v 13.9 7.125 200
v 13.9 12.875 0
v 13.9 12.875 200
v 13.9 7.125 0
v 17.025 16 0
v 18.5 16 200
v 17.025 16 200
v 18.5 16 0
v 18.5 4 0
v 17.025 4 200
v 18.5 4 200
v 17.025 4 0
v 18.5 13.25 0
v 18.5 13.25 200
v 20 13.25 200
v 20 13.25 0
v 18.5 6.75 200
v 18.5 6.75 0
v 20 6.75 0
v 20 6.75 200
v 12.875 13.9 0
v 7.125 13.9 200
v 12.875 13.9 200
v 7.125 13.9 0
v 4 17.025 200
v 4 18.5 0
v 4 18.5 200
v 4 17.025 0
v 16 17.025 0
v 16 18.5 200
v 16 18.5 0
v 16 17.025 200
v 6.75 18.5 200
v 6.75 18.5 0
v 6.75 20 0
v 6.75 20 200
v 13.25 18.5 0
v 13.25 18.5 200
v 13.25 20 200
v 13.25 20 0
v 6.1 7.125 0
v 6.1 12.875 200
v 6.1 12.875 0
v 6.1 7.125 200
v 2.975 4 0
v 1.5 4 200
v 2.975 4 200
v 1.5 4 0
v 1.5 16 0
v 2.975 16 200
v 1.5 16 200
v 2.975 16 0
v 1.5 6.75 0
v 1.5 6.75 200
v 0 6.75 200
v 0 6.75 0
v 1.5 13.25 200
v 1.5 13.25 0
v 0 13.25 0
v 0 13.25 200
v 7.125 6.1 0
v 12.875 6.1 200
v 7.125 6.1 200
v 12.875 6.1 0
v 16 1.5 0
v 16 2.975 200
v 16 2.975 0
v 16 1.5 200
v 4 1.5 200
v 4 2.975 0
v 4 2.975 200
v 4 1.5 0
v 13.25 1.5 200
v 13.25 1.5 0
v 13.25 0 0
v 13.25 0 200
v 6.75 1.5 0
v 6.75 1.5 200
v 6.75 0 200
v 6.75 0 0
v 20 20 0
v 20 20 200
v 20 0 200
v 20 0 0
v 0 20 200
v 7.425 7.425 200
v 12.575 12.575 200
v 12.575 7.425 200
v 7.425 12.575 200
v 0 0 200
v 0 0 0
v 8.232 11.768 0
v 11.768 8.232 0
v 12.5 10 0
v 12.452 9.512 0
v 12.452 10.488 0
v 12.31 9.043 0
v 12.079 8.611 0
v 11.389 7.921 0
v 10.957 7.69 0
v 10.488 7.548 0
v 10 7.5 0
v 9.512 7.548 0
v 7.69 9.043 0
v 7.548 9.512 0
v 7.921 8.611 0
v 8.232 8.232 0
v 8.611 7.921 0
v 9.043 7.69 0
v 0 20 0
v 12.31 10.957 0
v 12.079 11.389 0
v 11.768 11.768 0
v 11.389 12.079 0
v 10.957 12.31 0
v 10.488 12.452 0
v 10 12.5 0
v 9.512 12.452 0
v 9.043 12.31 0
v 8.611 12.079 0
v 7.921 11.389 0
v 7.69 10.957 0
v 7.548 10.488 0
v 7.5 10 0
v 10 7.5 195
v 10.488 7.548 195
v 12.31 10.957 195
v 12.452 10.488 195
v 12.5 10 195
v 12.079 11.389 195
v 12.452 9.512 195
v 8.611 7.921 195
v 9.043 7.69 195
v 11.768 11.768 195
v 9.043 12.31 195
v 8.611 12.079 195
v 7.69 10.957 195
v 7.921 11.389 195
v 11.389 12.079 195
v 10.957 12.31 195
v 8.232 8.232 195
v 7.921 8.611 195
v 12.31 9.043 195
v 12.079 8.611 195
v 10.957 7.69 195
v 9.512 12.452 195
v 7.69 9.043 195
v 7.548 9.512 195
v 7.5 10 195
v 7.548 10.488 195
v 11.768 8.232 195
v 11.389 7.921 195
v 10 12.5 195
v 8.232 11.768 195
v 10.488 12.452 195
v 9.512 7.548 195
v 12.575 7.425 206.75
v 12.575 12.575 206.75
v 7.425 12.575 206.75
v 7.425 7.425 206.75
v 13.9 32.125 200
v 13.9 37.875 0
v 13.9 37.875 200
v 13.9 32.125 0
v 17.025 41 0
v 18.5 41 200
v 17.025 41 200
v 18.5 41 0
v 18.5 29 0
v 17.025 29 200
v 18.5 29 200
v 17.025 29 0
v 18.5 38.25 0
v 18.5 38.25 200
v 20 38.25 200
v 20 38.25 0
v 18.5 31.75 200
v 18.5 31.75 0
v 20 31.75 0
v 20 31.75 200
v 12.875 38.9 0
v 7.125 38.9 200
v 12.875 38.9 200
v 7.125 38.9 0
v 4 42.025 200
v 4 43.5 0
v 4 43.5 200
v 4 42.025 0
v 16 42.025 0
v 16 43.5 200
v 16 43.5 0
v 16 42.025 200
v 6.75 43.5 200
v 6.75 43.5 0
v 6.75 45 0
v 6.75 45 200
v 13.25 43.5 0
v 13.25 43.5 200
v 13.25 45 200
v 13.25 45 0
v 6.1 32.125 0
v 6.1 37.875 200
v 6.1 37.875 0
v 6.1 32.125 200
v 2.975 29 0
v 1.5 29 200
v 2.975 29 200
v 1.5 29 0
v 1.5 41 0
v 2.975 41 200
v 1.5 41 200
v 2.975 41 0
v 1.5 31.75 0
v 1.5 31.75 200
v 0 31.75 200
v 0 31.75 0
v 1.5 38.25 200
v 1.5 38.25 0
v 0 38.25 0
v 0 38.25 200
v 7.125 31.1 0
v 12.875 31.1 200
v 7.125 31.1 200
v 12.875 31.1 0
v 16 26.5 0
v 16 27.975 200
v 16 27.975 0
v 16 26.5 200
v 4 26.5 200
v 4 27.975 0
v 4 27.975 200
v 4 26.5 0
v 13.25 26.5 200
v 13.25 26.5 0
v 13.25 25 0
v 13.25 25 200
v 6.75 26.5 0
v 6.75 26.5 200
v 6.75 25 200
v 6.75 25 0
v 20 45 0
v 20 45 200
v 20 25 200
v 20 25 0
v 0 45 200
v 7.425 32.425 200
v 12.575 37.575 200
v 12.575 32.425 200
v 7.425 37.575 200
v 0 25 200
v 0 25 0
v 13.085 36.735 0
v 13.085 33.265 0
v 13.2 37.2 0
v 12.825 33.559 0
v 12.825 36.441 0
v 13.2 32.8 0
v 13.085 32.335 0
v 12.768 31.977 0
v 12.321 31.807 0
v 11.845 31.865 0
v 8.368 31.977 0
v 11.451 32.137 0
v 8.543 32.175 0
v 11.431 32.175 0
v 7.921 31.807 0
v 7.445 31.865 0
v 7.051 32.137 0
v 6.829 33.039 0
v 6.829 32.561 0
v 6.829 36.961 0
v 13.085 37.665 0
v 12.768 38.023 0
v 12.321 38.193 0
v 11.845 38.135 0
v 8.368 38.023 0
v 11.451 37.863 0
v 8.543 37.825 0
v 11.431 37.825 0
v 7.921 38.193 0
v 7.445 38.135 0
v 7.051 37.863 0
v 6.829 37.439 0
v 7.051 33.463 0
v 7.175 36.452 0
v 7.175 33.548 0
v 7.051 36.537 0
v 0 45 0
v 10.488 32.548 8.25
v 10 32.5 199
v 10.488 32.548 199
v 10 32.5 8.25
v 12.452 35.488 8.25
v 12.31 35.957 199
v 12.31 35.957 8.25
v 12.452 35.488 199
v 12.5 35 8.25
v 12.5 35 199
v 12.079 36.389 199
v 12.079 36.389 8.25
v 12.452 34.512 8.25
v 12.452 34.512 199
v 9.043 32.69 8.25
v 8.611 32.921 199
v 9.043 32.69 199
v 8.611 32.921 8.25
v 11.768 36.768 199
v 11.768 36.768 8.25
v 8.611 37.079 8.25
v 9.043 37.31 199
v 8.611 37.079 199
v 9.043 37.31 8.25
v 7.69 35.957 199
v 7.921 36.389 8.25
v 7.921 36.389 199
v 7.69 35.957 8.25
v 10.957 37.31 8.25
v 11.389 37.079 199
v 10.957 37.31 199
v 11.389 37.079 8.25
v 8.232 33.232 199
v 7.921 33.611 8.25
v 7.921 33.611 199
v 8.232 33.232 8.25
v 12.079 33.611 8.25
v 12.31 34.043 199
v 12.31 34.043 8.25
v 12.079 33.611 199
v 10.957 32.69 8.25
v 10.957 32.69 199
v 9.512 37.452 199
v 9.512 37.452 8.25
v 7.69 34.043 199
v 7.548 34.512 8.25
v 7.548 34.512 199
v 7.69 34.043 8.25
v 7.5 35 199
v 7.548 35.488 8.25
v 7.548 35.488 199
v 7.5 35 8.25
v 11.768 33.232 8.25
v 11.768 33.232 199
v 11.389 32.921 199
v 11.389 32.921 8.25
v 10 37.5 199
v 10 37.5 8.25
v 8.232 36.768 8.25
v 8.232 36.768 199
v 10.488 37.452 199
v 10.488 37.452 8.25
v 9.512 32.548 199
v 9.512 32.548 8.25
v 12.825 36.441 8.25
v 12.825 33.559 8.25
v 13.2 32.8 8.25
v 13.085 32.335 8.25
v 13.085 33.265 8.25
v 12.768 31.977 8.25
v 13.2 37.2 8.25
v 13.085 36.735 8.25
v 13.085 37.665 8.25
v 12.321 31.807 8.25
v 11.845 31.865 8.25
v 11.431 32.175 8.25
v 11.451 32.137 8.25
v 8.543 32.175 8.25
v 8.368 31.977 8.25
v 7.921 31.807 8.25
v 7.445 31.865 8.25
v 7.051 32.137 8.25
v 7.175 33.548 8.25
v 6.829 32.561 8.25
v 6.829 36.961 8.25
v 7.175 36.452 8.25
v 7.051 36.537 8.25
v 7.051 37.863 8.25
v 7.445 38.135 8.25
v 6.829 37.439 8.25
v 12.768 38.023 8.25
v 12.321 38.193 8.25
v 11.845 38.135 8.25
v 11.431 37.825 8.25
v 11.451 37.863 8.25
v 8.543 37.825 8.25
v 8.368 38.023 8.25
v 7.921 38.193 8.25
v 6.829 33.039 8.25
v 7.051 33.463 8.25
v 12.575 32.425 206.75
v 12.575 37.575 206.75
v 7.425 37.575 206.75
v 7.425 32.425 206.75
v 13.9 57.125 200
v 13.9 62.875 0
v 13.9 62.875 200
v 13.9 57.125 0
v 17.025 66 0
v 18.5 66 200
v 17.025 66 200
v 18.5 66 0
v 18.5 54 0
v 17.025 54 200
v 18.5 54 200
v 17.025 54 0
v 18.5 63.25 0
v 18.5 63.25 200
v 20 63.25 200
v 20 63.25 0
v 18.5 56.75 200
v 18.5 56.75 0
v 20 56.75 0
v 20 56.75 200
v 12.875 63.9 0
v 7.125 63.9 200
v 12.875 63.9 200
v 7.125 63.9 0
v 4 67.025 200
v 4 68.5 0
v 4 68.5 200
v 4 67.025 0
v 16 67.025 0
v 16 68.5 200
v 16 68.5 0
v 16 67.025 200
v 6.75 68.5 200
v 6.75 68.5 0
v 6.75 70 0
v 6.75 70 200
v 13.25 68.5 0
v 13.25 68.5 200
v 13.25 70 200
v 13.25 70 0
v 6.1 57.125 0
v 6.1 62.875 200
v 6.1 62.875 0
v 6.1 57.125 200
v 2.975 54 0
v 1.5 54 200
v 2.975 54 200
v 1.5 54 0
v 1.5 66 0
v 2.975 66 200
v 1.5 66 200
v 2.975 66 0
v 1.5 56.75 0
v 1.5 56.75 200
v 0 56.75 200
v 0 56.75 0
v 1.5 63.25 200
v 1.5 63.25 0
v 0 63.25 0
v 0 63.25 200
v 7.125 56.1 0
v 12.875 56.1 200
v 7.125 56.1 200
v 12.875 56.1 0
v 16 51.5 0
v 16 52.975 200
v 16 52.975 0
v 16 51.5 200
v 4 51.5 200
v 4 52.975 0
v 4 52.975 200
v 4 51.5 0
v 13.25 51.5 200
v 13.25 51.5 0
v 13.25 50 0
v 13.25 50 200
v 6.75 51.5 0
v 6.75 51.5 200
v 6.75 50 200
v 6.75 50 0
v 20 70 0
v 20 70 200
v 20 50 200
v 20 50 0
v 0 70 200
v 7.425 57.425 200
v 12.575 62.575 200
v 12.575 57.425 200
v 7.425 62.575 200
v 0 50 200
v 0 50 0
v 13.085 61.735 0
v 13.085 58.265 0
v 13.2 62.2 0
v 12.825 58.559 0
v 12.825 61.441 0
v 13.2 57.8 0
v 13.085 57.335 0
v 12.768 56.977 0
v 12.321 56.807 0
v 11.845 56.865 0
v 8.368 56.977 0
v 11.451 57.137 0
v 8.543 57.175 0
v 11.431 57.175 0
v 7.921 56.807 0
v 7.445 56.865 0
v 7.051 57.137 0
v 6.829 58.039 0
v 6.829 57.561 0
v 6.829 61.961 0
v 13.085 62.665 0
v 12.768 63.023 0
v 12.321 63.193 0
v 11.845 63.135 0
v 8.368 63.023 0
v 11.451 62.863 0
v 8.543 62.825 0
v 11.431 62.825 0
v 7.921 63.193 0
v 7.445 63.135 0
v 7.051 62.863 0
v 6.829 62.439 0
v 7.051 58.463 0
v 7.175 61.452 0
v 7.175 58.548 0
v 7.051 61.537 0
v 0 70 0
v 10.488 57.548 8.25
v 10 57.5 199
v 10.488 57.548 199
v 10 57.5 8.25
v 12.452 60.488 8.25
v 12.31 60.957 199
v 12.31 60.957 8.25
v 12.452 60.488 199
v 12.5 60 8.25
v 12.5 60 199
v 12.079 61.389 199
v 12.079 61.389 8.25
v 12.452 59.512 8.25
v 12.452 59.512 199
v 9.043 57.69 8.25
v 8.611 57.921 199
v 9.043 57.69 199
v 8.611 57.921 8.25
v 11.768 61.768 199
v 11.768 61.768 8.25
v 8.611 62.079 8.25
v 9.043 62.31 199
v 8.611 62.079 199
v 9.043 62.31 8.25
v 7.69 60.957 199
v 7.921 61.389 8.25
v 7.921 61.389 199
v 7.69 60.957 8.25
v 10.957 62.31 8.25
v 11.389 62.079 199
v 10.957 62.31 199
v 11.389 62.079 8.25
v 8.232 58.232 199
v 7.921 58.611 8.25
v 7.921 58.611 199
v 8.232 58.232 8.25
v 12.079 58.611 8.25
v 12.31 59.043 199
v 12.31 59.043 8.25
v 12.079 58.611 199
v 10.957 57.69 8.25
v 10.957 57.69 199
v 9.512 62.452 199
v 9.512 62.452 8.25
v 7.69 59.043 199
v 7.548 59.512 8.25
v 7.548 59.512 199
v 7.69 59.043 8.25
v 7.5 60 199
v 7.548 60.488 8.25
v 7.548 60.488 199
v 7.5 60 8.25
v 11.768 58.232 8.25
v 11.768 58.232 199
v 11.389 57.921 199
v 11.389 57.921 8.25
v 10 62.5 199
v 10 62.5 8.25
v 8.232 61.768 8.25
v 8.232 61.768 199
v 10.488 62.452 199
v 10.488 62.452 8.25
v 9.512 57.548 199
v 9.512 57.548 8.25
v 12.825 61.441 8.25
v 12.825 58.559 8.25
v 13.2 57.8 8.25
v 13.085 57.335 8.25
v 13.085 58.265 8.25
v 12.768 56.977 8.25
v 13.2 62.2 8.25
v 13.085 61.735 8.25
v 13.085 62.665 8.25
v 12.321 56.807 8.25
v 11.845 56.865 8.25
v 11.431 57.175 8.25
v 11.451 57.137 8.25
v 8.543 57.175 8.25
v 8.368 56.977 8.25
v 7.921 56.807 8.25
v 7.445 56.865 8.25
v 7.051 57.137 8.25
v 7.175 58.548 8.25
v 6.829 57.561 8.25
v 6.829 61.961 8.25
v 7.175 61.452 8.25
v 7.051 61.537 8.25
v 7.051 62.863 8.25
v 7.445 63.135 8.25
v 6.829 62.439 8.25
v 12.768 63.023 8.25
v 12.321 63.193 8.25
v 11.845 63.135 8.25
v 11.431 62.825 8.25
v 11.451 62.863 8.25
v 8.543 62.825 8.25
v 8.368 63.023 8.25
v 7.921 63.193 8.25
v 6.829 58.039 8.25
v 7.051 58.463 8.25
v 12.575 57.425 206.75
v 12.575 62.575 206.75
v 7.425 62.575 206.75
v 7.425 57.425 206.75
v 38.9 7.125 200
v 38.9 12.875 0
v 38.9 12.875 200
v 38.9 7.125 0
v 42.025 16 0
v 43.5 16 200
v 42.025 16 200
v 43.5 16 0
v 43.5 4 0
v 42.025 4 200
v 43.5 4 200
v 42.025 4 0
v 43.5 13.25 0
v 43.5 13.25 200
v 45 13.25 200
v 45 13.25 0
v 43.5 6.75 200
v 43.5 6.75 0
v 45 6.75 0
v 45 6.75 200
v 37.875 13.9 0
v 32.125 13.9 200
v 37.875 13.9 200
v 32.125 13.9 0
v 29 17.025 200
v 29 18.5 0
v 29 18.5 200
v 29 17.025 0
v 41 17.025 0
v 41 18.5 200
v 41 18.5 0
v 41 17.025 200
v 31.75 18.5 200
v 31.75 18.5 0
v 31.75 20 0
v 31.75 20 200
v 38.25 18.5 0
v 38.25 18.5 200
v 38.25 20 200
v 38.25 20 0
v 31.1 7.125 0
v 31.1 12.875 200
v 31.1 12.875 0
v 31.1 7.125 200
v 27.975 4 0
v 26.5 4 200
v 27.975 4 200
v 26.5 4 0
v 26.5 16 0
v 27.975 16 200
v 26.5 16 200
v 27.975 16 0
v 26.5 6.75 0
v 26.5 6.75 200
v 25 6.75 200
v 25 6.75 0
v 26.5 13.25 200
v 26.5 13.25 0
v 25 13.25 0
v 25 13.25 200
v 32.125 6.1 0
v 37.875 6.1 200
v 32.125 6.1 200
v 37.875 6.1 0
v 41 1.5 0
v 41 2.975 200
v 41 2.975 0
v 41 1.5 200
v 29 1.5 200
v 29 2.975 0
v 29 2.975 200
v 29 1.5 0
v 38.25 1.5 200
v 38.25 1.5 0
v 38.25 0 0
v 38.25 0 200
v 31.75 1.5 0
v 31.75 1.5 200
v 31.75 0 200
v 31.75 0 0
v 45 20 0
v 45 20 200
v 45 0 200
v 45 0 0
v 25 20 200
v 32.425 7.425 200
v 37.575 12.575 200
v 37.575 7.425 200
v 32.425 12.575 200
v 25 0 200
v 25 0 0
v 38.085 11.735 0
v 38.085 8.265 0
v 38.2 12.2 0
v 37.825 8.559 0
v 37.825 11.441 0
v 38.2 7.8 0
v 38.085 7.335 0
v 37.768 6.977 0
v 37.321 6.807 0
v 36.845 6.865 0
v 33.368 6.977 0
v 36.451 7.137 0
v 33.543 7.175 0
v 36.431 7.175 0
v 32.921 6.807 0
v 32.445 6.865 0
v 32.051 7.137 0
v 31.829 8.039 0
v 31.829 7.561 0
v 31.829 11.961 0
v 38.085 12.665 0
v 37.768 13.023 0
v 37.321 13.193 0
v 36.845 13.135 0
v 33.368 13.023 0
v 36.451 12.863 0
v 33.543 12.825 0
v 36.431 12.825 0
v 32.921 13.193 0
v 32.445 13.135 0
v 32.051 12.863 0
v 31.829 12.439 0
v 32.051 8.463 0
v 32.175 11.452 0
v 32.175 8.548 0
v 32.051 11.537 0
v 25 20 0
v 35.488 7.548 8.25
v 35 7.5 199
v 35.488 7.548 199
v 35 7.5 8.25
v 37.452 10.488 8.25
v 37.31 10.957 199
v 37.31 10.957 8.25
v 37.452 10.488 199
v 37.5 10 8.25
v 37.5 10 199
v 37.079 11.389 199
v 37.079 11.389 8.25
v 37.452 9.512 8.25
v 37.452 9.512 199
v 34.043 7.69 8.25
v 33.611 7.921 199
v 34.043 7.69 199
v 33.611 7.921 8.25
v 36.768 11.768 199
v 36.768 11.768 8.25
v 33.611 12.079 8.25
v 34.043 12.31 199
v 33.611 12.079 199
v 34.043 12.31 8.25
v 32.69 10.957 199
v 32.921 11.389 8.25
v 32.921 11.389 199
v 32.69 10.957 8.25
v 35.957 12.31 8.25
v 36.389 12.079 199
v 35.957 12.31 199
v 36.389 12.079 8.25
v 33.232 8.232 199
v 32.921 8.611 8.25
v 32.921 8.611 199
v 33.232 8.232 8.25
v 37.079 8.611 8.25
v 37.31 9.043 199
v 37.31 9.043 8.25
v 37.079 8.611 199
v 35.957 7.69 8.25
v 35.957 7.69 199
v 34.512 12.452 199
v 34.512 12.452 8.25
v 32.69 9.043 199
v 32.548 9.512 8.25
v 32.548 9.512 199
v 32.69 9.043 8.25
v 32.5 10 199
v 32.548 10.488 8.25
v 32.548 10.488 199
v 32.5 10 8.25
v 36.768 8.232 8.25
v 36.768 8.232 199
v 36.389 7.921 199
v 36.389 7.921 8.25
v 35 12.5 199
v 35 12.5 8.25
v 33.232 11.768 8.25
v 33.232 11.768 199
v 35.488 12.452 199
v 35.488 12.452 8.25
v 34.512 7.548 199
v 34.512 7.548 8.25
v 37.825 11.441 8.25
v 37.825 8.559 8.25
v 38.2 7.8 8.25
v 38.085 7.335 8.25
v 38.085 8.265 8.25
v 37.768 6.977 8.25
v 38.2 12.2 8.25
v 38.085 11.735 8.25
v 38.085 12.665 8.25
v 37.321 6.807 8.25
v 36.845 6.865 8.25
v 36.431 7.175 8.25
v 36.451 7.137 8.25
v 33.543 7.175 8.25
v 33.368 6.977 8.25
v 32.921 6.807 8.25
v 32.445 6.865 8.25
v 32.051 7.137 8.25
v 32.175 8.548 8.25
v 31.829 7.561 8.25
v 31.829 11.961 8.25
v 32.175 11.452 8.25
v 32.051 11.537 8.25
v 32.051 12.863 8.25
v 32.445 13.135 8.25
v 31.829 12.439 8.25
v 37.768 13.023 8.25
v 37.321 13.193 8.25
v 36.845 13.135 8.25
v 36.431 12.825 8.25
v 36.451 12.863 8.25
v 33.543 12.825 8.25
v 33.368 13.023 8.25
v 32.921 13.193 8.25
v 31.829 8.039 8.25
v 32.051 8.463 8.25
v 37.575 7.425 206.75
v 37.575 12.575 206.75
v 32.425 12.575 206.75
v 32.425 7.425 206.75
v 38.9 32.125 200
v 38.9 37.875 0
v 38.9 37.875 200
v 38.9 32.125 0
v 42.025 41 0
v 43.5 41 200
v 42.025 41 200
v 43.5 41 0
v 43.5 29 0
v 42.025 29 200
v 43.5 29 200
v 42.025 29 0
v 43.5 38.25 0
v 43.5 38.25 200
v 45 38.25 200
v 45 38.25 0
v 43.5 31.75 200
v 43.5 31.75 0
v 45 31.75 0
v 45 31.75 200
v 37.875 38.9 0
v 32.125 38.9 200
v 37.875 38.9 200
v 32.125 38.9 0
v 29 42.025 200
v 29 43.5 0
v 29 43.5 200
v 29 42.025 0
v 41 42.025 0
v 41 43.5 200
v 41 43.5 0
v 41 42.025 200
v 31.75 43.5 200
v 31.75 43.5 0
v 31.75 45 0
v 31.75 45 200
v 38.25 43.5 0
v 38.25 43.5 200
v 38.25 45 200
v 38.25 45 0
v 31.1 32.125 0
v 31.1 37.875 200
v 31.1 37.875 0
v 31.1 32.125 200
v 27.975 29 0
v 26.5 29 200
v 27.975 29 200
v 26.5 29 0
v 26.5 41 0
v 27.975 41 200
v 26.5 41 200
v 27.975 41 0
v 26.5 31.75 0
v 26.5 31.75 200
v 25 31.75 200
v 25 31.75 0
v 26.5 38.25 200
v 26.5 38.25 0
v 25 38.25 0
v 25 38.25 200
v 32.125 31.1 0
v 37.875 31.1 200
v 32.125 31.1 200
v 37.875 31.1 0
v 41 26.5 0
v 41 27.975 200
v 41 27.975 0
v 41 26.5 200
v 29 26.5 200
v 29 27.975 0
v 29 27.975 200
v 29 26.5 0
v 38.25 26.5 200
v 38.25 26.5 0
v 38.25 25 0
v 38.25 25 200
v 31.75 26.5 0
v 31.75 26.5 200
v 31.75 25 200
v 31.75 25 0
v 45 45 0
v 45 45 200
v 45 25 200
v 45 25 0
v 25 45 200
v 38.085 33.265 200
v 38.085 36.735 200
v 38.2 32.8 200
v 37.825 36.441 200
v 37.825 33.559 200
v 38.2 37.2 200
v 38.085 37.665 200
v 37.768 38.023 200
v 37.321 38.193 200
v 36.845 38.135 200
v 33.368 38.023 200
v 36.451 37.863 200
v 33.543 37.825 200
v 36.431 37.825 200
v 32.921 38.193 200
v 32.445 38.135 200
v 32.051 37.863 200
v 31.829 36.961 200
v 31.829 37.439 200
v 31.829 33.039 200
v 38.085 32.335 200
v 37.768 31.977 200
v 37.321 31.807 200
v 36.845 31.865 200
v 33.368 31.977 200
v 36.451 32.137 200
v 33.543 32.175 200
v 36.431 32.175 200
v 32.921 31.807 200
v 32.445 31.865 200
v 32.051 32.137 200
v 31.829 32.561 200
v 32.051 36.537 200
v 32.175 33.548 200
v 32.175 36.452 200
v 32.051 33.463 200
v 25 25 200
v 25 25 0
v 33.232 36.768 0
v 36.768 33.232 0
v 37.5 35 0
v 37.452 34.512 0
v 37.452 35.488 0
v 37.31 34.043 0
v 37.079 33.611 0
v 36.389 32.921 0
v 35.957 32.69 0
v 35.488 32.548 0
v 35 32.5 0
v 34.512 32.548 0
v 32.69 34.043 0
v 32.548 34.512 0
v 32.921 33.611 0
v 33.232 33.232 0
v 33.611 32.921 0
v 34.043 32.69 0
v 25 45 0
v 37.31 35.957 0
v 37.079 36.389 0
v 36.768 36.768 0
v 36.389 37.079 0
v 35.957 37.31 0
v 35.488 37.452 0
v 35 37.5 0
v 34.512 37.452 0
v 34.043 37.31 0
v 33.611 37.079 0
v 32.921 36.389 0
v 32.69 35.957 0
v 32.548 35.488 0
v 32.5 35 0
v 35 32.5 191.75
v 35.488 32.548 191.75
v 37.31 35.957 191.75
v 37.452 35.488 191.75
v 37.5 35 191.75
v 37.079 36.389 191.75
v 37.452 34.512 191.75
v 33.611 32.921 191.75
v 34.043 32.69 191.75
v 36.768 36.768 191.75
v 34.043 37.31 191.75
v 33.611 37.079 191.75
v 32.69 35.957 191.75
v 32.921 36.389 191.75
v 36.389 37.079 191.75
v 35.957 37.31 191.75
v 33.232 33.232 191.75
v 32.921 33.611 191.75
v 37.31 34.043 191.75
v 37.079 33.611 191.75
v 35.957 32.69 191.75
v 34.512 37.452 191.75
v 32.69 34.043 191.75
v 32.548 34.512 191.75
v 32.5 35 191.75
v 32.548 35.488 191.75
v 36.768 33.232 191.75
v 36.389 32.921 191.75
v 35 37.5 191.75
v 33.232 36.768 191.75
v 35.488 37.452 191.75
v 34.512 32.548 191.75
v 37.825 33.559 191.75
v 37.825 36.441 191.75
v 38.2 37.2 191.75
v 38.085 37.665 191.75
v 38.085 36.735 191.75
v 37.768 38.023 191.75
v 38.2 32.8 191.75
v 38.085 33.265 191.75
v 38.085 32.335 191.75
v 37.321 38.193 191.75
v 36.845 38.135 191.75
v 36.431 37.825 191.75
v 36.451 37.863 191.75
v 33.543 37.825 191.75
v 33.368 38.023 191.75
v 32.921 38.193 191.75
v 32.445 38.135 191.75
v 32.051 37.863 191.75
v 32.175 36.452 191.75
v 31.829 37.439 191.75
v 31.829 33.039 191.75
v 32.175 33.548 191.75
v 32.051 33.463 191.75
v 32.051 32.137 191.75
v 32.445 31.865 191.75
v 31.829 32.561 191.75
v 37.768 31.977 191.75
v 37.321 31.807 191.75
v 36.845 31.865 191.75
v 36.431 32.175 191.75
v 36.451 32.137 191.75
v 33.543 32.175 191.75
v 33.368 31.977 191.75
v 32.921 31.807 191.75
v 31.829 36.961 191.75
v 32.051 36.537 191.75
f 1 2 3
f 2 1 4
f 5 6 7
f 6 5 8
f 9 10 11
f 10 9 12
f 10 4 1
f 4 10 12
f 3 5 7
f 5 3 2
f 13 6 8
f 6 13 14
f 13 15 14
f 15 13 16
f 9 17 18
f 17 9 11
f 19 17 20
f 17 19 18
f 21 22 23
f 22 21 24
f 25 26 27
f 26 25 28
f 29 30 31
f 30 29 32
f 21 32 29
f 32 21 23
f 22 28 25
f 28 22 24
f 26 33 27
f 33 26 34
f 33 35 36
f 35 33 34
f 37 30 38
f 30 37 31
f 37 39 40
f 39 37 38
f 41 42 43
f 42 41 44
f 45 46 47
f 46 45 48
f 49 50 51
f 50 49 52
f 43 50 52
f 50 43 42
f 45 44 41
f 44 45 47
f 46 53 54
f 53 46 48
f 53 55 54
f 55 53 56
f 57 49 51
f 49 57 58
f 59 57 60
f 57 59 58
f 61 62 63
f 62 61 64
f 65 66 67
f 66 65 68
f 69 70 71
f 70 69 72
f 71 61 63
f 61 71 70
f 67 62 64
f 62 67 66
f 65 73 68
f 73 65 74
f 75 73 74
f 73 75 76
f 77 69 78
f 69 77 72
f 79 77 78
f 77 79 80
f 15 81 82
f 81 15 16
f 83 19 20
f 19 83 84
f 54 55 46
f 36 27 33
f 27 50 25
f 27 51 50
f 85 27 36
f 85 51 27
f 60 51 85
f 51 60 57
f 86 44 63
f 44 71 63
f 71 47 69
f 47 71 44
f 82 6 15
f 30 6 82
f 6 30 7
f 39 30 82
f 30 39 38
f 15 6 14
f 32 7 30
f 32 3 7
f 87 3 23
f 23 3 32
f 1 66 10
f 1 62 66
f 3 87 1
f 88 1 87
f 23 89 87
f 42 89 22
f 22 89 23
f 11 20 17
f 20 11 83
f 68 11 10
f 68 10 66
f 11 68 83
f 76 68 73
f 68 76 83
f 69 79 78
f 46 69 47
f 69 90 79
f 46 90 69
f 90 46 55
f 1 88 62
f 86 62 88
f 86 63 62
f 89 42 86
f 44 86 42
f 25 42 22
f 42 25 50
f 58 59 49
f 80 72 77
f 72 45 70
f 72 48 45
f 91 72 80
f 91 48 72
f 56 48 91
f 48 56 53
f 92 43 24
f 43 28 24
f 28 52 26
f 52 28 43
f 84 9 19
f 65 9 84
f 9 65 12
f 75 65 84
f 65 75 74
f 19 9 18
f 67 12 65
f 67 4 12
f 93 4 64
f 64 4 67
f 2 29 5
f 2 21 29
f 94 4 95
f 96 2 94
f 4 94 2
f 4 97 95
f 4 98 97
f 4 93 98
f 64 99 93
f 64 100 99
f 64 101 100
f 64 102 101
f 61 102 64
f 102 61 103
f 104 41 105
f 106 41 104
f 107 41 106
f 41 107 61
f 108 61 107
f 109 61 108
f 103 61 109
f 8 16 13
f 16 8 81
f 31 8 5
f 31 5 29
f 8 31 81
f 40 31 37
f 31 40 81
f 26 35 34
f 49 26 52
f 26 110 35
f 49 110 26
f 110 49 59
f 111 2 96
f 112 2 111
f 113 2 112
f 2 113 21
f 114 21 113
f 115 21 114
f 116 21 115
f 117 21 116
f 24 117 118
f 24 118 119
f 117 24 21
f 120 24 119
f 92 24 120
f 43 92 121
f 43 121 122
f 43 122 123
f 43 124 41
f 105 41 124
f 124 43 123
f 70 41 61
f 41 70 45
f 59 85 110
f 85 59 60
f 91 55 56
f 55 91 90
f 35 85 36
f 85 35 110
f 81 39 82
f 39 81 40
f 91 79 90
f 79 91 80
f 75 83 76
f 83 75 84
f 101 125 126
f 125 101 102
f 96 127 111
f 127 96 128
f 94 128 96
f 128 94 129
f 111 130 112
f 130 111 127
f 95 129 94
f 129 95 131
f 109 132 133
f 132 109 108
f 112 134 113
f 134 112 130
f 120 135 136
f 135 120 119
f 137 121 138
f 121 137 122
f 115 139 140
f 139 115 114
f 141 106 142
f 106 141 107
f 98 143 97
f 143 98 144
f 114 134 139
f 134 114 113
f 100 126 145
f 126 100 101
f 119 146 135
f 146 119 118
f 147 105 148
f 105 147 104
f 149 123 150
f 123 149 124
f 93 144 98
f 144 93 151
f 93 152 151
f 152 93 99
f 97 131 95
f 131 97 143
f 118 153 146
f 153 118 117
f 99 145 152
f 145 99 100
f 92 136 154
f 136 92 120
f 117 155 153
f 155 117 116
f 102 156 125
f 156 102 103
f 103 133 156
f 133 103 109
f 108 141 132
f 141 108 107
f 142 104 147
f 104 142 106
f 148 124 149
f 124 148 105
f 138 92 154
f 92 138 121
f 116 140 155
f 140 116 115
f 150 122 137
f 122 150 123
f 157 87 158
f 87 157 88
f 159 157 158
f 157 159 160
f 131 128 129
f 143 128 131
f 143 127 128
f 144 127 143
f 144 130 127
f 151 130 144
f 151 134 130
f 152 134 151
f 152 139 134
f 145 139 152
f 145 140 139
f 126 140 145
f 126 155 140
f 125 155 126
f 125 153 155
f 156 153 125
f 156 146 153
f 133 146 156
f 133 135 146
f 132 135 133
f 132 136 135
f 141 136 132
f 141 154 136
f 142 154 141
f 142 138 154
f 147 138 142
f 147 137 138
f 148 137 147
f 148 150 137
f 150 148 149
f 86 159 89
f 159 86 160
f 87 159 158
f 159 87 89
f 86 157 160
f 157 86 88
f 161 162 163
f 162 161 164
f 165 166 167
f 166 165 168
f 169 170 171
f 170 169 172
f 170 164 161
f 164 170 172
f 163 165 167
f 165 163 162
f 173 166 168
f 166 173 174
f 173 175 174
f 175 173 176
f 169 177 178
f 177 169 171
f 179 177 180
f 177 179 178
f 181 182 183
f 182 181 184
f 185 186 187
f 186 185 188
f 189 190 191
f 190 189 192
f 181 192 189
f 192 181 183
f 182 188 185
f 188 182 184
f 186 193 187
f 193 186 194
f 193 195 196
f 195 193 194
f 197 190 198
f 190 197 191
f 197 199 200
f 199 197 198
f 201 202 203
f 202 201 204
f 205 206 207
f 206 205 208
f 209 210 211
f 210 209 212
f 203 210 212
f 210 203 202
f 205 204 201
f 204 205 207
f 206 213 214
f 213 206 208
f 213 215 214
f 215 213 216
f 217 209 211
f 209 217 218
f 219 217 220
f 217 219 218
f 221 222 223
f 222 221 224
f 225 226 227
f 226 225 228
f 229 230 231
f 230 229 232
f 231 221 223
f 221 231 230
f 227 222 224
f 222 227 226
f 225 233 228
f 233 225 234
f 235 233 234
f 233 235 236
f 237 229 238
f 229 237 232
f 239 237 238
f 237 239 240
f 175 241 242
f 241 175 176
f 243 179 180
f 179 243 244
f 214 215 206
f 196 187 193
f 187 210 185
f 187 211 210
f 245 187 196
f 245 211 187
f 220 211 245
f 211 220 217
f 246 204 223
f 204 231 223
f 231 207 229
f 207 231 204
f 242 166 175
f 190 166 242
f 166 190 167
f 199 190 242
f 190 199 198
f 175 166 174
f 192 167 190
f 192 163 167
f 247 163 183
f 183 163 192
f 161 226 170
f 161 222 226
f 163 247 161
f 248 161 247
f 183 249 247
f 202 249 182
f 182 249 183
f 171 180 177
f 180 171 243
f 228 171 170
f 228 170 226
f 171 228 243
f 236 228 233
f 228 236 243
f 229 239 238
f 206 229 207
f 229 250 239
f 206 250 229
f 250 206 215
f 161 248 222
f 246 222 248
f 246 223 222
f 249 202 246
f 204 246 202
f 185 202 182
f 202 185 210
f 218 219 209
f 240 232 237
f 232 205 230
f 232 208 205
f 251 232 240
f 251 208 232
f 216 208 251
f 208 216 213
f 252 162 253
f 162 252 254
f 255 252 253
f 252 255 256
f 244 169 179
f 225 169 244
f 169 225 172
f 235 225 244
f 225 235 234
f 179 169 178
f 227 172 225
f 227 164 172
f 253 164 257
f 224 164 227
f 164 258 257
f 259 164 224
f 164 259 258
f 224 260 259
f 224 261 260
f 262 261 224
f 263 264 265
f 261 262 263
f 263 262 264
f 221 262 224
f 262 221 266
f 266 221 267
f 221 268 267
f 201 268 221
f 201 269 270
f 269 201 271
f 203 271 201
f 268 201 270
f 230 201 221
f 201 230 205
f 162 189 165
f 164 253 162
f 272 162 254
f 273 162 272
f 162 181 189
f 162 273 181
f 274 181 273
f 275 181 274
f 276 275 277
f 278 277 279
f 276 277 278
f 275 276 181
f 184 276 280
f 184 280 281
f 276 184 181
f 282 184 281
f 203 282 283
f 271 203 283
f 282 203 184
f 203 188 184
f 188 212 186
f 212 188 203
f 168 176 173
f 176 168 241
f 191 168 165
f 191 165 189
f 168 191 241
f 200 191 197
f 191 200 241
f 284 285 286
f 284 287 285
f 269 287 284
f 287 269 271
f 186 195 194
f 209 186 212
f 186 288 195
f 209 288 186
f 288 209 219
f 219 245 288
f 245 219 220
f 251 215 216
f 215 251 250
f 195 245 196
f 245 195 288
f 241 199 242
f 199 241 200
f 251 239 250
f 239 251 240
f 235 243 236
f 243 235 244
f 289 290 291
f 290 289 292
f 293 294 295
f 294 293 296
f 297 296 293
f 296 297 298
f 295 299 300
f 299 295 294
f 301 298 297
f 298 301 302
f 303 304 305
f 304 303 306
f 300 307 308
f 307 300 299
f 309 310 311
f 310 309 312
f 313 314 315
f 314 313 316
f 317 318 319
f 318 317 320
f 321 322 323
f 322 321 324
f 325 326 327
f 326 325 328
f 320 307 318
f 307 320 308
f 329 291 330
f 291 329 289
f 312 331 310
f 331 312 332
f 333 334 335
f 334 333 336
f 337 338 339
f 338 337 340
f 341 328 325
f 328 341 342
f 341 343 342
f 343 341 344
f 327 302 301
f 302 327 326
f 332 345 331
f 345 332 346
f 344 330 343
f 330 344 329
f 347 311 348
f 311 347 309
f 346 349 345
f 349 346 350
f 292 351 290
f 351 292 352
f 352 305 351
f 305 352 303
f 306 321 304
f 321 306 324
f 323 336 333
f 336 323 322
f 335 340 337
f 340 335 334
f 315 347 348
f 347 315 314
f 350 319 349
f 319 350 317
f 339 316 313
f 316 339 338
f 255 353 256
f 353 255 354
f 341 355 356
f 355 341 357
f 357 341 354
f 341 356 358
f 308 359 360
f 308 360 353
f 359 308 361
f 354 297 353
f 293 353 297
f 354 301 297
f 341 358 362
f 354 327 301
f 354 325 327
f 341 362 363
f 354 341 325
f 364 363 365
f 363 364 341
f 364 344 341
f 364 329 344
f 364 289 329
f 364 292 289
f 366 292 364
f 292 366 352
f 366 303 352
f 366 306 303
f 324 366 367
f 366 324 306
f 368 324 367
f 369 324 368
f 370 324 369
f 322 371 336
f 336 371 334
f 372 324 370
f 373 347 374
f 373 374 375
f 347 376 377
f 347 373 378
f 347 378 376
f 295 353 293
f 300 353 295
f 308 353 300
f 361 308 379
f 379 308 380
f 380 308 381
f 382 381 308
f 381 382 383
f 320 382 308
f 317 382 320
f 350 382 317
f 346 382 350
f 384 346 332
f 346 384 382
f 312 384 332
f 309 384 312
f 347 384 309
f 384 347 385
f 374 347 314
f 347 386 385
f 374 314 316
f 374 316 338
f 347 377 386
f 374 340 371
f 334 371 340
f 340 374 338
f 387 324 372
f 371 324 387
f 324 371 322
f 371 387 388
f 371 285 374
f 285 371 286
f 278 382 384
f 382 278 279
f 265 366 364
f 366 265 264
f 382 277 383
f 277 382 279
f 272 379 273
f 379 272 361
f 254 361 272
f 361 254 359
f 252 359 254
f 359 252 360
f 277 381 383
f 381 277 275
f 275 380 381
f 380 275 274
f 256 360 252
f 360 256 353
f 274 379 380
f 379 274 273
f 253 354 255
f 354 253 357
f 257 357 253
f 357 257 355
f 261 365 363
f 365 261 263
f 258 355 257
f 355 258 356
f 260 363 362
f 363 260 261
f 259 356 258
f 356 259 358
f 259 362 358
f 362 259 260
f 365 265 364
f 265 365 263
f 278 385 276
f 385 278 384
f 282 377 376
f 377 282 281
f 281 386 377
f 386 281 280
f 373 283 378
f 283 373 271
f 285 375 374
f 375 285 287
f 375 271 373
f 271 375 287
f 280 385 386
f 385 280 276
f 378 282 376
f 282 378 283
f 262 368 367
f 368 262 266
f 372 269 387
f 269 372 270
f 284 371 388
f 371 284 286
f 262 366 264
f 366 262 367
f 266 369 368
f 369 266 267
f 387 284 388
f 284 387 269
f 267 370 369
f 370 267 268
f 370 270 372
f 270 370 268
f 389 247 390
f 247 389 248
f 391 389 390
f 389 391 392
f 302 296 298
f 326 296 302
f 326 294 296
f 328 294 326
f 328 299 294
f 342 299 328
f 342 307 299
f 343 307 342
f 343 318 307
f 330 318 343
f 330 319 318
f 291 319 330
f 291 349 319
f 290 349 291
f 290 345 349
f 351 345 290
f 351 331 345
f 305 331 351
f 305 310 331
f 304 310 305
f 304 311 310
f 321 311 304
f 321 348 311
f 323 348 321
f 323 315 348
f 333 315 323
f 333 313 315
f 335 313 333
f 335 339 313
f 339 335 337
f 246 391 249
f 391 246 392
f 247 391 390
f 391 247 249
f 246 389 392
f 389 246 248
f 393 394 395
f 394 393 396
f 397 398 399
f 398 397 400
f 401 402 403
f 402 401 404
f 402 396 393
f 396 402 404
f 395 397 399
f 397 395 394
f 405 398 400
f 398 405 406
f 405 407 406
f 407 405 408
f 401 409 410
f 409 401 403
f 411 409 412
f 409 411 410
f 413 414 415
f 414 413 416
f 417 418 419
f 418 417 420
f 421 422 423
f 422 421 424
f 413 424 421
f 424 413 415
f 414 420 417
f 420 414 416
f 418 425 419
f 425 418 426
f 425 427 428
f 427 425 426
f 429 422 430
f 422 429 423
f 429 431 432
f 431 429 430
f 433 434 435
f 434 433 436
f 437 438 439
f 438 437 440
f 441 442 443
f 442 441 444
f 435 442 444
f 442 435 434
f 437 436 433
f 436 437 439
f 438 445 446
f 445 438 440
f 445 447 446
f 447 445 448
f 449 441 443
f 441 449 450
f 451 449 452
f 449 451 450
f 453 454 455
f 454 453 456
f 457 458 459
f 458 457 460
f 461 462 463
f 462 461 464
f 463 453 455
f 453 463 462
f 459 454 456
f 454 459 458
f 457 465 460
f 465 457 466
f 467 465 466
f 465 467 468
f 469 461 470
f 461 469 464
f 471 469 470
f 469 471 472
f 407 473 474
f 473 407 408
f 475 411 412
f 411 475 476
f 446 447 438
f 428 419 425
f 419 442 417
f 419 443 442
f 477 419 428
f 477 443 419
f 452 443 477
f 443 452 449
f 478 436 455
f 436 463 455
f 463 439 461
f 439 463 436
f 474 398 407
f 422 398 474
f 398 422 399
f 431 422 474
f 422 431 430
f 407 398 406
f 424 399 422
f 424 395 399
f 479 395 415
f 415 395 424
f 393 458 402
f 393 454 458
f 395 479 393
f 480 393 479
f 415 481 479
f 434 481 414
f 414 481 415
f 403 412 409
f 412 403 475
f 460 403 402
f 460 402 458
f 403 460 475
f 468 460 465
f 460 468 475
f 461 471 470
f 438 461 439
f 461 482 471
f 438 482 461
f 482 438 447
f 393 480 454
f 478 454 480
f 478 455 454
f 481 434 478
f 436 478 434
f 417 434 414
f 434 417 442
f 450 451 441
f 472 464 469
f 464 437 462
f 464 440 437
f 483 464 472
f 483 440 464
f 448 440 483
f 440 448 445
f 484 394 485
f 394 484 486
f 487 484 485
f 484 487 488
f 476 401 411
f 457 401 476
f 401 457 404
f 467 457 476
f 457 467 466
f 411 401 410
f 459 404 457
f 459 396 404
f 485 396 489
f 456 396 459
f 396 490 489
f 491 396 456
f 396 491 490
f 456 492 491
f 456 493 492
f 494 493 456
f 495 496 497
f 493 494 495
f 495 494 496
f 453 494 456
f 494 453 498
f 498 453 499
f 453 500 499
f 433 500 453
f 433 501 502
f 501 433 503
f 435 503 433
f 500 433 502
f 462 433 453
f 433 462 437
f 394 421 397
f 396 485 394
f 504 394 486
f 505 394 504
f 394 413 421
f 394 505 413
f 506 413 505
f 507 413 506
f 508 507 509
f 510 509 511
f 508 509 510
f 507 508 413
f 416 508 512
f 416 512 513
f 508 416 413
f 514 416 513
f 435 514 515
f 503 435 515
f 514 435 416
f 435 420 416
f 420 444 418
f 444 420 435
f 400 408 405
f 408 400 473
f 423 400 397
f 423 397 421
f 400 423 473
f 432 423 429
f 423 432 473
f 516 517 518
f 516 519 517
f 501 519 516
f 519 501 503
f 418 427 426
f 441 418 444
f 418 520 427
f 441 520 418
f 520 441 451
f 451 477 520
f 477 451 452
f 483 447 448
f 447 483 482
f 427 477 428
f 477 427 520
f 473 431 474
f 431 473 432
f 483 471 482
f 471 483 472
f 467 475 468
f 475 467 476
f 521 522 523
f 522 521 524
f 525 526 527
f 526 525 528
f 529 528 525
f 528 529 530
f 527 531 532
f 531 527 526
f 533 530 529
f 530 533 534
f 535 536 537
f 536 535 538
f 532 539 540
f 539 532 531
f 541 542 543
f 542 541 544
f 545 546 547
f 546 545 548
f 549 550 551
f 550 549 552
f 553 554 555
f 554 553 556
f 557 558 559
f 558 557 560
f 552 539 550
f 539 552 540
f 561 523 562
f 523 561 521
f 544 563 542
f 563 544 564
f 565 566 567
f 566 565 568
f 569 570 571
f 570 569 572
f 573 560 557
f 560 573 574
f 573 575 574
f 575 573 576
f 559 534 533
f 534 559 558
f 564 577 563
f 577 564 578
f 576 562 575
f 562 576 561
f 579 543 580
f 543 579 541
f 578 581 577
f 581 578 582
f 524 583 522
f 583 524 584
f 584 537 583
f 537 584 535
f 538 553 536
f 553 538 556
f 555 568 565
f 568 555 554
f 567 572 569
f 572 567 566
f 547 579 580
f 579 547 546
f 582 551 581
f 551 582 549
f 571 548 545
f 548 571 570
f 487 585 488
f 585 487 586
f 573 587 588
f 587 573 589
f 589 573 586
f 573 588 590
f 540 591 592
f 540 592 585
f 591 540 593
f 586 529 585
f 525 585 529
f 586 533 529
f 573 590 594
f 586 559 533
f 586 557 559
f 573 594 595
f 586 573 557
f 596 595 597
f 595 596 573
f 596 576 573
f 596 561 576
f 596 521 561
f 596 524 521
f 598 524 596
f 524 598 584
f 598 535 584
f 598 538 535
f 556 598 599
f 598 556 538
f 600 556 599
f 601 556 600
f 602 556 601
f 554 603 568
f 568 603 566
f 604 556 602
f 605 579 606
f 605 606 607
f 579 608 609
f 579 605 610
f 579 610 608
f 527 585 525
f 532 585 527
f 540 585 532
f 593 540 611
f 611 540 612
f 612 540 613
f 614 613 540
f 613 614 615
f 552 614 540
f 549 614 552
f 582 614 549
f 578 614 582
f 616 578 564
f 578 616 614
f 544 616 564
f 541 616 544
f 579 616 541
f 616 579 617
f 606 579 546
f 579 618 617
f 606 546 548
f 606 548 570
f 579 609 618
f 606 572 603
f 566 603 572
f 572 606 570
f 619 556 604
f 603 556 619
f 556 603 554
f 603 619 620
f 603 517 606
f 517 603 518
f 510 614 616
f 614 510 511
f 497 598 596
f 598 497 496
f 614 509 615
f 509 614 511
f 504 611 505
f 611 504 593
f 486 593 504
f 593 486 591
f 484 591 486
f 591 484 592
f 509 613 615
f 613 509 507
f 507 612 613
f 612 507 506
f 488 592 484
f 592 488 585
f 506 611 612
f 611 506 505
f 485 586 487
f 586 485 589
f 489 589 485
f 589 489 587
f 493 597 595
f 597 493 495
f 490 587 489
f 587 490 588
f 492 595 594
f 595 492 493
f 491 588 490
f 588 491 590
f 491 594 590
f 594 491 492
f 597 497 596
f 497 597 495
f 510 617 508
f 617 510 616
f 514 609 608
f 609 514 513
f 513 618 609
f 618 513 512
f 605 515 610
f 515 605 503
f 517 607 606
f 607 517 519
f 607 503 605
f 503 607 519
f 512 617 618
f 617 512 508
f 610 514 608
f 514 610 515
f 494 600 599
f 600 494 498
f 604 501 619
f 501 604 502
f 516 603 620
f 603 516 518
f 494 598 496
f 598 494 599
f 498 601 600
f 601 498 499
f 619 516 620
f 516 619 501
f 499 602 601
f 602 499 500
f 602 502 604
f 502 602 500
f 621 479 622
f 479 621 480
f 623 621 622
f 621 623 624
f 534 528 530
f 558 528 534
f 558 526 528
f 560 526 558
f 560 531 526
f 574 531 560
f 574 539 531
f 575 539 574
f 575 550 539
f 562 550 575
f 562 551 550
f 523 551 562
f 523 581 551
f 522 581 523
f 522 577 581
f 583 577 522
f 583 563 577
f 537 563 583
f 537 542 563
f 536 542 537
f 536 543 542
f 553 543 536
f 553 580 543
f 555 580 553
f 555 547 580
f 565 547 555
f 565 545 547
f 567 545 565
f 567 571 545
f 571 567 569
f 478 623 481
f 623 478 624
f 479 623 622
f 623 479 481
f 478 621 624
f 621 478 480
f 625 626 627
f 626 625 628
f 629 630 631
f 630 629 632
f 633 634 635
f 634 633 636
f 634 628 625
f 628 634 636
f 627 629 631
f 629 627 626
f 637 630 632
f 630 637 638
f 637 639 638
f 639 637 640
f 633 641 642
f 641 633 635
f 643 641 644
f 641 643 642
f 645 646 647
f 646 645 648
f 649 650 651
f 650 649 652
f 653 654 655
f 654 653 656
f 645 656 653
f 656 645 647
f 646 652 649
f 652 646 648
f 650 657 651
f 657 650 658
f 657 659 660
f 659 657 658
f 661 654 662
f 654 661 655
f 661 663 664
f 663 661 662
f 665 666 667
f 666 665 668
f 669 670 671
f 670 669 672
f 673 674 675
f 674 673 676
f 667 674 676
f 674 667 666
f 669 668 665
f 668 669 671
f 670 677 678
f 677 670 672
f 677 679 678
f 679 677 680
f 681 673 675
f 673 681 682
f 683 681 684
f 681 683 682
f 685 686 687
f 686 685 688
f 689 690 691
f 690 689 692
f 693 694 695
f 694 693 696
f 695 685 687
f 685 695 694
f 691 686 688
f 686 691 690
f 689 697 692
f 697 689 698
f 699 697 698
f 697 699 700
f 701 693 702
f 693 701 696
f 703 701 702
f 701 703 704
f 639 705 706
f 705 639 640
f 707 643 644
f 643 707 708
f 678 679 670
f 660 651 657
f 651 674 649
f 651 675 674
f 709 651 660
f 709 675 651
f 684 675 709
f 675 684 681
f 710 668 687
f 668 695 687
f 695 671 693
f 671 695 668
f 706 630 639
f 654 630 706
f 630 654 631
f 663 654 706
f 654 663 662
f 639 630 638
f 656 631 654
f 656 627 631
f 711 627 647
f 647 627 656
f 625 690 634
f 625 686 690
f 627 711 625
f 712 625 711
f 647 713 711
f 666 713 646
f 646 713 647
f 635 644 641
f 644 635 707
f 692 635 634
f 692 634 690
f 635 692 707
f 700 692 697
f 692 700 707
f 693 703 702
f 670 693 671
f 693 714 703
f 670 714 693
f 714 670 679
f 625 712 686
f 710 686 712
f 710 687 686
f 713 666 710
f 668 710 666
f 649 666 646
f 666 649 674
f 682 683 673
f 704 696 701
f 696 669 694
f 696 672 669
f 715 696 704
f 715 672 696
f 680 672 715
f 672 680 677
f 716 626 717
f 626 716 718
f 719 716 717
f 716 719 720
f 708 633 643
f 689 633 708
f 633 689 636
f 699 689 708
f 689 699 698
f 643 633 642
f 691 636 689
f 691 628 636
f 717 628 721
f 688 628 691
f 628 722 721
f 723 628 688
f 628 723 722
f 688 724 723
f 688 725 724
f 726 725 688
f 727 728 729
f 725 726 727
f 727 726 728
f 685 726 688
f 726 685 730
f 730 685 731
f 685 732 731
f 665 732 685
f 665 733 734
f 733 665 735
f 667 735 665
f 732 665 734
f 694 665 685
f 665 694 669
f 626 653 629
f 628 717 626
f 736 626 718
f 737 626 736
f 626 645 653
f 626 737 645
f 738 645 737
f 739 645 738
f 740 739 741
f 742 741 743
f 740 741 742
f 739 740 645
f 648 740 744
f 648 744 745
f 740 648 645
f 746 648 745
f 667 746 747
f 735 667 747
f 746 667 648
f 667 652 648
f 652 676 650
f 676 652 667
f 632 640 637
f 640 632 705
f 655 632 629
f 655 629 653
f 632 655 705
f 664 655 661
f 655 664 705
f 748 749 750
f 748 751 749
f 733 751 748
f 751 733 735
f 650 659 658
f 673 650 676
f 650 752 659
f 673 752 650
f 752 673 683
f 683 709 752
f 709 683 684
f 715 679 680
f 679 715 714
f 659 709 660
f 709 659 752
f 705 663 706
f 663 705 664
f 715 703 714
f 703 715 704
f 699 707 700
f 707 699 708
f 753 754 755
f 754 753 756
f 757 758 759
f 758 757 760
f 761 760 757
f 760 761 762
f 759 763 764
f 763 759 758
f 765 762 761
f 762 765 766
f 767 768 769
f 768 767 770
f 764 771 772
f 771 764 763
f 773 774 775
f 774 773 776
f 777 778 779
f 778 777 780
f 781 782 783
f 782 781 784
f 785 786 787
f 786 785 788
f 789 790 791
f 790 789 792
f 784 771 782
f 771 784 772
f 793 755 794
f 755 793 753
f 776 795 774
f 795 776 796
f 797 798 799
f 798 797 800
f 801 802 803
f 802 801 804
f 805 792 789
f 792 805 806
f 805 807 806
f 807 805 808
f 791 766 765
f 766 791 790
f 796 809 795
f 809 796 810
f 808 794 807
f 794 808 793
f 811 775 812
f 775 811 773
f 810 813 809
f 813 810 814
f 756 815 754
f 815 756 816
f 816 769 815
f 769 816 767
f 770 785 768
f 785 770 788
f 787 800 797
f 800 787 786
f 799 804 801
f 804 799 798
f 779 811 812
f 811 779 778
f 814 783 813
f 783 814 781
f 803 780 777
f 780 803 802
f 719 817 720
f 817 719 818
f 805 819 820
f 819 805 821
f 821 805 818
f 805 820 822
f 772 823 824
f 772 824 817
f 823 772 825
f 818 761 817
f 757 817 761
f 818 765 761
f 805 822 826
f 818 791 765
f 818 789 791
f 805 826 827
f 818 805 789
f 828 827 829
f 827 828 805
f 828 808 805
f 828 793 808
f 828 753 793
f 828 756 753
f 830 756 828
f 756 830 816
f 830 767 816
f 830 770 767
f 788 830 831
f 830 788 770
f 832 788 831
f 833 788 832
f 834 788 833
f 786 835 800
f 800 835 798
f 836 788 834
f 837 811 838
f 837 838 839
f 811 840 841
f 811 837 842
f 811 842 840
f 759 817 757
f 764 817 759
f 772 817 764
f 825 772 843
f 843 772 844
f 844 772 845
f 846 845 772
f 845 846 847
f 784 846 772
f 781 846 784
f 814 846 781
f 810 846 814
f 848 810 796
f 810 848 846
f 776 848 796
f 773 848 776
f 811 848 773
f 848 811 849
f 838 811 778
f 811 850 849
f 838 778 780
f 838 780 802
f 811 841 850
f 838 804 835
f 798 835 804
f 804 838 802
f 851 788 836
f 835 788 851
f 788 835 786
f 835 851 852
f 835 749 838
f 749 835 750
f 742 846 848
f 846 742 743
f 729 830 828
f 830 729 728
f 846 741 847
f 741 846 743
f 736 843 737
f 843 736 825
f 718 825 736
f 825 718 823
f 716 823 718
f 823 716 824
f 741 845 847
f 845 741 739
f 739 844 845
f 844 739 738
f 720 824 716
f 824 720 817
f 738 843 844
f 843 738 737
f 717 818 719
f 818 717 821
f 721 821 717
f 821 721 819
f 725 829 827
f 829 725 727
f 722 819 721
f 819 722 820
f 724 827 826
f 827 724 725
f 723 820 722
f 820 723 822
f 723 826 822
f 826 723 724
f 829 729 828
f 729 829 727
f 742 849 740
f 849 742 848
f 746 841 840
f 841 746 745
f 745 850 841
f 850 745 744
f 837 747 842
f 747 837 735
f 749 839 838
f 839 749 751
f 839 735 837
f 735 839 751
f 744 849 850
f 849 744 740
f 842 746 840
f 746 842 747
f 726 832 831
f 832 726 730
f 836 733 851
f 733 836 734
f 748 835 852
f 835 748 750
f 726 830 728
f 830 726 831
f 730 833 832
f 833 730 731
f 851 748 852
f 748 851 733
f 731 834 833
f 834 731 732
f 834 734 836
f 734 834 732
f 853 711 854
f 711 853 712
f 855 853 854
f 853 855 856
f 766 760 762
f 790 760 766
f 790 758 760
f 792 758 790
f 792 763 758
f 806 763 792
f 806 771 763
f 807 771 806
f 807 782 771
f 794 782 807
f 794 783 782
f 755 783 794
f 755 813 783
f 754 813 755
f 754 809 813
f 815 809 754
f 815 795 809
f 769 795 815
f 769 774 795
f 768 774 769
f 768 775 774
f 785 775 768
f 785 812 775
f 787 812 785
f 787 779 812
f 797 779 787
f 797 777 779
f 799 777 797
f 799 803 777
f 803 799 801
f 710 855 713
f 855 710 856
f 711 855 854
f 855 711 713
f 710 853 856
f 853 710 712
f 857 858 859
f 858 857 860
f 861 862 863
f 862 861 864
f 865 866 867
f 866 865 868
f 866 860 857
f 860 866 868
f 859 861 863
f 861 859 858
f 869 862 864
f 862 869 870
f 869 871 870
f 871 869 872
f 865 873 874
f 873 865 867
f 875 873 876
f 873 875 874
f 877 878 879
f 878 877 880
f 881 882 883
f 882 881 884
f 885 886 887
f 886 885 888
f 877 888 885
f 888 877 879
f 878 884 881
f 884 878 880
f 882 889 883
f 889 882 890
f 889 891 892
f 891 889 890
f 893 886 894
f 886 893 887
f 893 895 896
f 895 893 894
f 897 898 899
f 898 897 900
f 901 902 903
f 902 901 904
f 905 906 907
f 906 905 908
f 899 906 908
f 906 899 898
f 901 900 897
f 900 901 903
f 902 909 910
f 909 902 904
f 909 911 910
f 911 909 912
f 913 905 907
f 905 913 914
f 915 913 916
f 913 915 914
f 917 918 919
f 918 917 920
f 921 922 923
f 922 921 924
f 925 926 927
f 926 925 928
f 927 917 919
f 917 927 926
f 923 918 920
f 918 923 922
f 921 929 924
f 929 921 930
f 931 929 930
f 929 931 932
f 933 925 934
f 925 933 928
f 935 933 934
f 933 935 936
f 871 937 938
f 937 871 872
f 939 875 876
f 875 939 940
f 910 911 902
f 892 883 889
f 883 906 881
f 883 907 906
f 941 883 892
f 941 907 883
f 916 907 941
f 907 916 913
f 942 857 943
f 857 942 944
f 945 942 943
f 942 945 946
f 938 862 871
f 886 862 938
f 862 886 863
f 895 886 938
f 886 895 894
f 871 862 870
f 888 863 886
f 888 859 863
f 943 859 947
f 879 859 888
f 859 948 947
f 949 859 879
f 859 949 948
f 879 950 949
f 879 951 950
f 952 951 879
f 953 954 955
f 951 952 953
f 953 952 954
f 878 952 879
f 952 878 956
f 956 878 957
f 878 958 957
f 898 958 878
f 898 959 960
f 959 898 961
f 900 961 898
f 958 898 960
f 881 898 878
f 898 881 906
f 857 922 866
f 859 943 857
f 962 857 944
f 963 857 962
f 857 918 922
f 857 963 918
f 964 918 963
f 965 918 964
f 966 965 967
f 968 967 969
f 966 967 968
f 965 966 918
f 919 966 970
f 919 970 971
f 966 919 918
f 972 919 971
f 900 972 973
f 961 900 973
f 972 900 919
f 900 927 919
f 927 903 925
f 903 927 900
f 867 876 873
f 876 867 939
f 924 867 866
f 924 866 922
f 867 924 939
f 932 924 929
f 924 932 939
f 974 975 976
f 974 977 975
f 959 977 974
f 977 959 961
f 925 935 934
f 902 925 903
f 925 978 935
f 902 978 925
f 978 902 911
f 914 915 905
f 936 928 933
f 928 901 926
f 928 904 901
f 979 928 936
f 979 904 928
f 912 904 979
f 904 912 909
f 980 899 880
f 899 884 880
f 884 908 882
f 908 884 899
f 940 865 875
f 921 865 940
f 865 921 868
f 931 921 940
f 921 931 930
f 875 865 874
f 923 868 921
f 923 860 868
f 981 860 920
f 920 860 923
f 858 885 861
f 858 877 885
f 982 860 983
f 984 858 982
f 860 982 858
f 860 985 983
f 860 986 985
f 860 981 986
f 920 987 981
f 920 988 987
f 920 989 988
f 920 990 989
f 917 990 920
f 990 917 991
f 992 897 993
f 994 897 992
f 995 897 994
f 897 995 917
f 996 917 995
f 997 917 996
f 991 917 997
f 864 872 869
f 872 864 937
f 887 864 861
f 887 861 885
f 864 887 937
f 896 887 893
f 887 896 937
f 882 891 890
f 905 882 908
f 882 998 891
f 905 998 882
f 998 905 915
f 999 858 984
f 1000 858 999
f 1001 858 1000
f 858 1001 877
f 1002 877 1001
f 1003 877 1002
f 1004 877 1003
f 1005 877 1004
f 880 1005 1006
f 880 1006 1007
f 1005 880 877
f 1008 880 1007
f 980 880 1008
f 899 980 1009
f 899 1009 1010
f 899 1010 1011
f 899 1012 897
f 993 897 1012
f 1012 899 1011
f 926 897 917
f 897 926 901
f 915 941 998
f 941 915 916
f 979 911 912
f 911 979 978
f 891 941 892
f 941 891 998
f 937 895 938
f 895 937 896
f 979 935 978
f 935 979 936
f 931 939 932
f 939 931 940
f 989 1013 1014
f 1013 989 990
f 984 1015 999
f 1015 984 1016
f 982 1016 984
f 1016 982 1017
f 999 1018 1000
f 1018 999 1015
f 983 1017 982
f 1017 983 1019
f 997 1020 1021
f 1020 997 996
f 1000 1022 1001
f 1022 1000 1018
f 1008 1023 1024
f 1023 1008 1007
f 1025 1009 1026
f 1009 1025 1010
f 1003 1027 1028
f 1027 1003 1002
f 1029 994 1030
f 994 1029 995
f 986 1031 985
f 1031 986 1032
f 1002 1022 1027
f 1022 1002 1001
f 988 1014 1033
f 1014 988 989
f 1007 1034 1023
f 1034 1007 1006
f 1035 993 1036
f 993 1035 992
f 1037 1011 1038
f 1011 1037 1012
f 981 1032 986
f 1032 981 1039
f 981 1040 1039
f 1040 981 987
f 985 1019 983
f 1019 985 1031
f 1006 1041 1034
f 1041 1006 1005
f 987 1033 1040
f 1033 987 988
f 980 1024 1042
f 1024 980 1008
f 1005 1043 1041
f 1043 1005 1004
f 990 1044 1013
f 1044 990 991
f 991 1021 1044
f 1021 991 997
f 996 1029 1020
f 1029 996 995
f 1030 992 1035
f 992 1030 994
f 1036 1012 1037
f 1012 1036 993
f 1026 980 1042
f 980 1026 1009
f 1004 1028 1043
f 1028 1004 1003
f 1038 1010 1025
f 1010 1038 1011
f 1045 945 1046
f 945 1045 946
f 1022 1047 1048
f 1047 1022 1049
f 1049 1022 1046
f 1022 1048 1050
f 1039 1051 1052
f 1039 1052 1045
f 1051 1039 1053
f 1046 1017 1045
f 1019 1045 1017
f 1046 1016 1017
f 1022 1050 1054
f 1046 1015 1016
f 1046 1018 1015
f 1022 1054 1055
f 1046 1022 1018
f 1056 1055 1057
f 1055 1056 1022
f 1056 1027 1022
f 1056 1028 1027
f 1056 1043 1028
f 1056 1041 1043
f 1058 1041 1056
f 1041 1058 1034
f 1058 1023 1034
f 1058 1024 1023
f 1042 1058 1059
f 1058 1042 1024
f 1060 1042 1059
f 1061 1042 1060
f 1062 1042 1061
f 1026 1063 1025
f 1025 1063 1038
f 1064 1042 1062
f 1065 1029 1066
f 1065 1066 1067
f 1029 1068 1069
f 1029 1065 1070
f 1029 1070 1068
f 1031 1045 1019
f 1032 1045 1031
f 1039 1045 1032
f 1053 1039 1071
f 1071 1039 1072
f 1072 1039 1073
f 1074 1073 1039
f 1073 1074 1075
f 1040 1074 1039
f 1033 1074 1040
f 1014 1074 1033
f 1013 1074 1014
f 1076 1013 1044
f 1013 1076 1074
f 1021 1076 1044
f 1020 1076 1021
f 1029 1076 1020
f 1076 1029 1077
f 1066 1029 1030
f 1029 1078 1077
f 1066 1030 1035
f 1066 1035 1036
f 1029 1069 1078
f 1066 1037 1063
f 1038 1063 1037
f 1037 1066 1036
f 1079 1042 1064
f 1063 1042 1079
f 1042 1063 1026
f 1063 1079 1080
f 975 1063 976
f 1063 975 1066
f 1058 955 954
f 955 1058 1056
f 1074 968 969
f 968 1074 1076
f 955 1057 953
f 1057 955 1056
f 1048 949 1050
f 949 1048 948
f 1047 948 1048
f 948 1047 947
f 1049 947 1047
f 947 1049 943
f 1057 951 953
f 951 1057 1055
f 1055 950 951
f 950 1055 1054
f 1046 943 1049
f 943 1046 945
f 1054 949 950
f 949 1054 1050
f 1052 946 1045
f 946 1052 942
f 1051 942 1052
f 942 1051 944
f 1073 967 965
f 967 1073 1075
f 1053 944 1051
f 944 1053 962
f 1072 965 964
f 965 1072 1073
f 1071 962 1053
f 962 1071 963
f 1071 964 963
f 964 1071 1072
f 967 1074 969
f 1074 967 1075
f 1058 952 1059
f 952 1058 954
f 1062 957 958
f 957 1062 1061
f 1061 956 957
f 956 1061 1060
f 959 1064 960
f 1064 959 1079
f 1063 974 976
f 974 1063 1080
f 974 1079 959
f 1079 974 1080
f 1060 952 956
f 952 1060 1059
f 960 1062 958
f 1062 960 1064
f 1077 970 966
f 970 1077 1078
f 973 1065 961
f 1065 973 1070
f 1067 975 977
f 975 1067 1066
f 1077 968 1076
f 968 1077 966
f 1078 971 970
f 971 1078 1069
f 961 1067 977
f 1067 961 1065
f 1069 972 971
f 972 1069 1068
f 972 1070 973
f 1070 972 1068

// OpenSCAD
profileLength = 1000;
//printX = 150; Not implemented
//printY = 150; Not implemented
printZHeight = 230;
printTolerance = 0.25; //Change dimensions of pin and hole 0.25mm equals gab of 0.5 mm
spaceBetweenProfiles = 5;
$fa=0.5; // default minimum facet angle is now 0.5
$fs=0.5; // default minimum facet size is now 0.5 mm

if(profileLength <= printZHeight) {
	translate([10,10,profileLength/2]) profile(profileLength);
} else {
	numOfProfiles = ceil(profileLength/(printZHeight-8));
	numOfRow = ceil(sqrt(numOfProfiles));
	currentProfile = 2;
	start = 0;
	translate([start,start,0]) profileWithPin(profileLength/numOfProfiles, printTolerance);
	for(row=[0:numOfRow-1]) {
		for(col=[0:numOfRow-1]) {
			if(row*numOfRow+col < numOfProfiles-1 && row*numOfRow+col > 0) {
				translate([start+row*(20+spaceBetweenProfiles),start+col*(20+spaceBetweenProfiles),0]) profileWithHoleAndPin(profileLength/numOfProfiles, printTolerance);
			} else {
				if(row*numOfRow+col < numOfProfiles) {
					translate([start+row*(20+spaceBetweenProfiles),start+col*(20+spaceBetweenProfiles),0]) profileWithHole(profileLength/numOfProfiles, printTolerance);
					lastProfileDone = 1;
				}
			}
		}
	}
}

module hole(height, size) {
	radius = 1;
	divider = 1.6;
	union() {
		cube([size,size,height], center = true);
		translate([size/2-radius/divider,size/2-radius/divider,0]) cylinder(h=height, r=radius, center = true);
		translate([size/2-radius/divider,-size/2+radius/divider,0]) cylinder(h=height, r=radius, center = true);
		translate([-size/2+radius/divider,size/2-radius/divider,0]) cylinder(h=height, r=radius, center = true);
		translate([-size/2+radius/divider,-size/2+radius/divider,0]) cylinder(h=height, r=radius, center = true);
	}
}

module profileWithPin(length, tolerance) {
	height = 8 - tolerance - 1;
	size = 5.4 - tolerance;
	plunge = 5;
	translate([10,10,length/2]) union() {
		profile(length);
		translate([0,0,length/2+(height+plunge)/2-plunge]) cube([size,size,height+plunge], center = true);
	}
}

module profileWithHole(length, tolerance) {
	height = 8 + tolerance;
	size = 5.4 + tolerance;
	plunge = 1;
	translate([10,10,length/2]) difference() {
		profile(length);
		translate([0,0,length/2-(height+plunge)/2+plunge]) hole(height+plunge, size);
	}
}

module profileWithHoleAndPin(length, tolerance) {
	heightHole = 8 + tolerance;
	heightPin = 7 - tolerance;
	size = 5.4;
	plunge = 1;
	translate([10,10,length/2]) union() {
		difference() {
			profile(length);
			translate([0,0,-length/2+(heightHole+plunge)/2-plunge]) hole(heightHole+plunge, size+tolerance);
		}
		translate([0,0,length/2+(heightPin+plunge)/2-plunge]) cube([size-tolerance,size-tolerance,heightPin+plunge], center = true);
	}
}

module profile(length) { // generate a profile based on length
	difference() {
		// Create main body
		cube([20,20,length], center = true);
		
		// Create hole in middle
		cylinder(r=5/2, h=length+2, center = true);

		// Create groove
		grooveLength = length + 2;
		lengthOfCenterSide = 5.75;
		gabWidth = 6.5;
		gabDepth = 6.1;
		sizeOfCube = 12;
		gabFrontWallWidth = 1.5;
		sizeOfCornerCube = sqrt(pow(sizeOfCube/2, 2)*2);
		for(i = [0:90:270]) {
			rotate([0,0,i]) translate([sizeOfCube/2-gabDepth+20/2,0,0]) difference() {
				cube([sizeOfCube,sizeOfCube,grooveLength], center = true);
				translate([-sizeOfCube/2,-sizeOfCube/2-lengthOfCenterSide/2,0]) rotate([0,0,45]) cube([sizeOfCornerCube,sizeOfCornerCube,grooveLength+2], center = true);
				translate([-sizeOfCube/2,sizeOfCube/2+lengthOfCenterSide/2,0]) rotate([0,0,45]) cube([sizeOfCornerCube,sizeOfCornerCube,grooveLength+2], center = true);
				translate([gabDepth-gabFrontWallWidth,sizeOfCube/2+gabWidth/2,0]) cube([sizeOfCube,sizeOfCube,grooveLength+2], center = true);
				translate([gabDepth-gabFrontWallWidth,-sizeOfCube/2-gabWidth/2,0]) cube([sizeOfCube,sizeOfCube,grooveLength+2], center = true);
			}
		}
	}
}
//cube([20,20,length]);
